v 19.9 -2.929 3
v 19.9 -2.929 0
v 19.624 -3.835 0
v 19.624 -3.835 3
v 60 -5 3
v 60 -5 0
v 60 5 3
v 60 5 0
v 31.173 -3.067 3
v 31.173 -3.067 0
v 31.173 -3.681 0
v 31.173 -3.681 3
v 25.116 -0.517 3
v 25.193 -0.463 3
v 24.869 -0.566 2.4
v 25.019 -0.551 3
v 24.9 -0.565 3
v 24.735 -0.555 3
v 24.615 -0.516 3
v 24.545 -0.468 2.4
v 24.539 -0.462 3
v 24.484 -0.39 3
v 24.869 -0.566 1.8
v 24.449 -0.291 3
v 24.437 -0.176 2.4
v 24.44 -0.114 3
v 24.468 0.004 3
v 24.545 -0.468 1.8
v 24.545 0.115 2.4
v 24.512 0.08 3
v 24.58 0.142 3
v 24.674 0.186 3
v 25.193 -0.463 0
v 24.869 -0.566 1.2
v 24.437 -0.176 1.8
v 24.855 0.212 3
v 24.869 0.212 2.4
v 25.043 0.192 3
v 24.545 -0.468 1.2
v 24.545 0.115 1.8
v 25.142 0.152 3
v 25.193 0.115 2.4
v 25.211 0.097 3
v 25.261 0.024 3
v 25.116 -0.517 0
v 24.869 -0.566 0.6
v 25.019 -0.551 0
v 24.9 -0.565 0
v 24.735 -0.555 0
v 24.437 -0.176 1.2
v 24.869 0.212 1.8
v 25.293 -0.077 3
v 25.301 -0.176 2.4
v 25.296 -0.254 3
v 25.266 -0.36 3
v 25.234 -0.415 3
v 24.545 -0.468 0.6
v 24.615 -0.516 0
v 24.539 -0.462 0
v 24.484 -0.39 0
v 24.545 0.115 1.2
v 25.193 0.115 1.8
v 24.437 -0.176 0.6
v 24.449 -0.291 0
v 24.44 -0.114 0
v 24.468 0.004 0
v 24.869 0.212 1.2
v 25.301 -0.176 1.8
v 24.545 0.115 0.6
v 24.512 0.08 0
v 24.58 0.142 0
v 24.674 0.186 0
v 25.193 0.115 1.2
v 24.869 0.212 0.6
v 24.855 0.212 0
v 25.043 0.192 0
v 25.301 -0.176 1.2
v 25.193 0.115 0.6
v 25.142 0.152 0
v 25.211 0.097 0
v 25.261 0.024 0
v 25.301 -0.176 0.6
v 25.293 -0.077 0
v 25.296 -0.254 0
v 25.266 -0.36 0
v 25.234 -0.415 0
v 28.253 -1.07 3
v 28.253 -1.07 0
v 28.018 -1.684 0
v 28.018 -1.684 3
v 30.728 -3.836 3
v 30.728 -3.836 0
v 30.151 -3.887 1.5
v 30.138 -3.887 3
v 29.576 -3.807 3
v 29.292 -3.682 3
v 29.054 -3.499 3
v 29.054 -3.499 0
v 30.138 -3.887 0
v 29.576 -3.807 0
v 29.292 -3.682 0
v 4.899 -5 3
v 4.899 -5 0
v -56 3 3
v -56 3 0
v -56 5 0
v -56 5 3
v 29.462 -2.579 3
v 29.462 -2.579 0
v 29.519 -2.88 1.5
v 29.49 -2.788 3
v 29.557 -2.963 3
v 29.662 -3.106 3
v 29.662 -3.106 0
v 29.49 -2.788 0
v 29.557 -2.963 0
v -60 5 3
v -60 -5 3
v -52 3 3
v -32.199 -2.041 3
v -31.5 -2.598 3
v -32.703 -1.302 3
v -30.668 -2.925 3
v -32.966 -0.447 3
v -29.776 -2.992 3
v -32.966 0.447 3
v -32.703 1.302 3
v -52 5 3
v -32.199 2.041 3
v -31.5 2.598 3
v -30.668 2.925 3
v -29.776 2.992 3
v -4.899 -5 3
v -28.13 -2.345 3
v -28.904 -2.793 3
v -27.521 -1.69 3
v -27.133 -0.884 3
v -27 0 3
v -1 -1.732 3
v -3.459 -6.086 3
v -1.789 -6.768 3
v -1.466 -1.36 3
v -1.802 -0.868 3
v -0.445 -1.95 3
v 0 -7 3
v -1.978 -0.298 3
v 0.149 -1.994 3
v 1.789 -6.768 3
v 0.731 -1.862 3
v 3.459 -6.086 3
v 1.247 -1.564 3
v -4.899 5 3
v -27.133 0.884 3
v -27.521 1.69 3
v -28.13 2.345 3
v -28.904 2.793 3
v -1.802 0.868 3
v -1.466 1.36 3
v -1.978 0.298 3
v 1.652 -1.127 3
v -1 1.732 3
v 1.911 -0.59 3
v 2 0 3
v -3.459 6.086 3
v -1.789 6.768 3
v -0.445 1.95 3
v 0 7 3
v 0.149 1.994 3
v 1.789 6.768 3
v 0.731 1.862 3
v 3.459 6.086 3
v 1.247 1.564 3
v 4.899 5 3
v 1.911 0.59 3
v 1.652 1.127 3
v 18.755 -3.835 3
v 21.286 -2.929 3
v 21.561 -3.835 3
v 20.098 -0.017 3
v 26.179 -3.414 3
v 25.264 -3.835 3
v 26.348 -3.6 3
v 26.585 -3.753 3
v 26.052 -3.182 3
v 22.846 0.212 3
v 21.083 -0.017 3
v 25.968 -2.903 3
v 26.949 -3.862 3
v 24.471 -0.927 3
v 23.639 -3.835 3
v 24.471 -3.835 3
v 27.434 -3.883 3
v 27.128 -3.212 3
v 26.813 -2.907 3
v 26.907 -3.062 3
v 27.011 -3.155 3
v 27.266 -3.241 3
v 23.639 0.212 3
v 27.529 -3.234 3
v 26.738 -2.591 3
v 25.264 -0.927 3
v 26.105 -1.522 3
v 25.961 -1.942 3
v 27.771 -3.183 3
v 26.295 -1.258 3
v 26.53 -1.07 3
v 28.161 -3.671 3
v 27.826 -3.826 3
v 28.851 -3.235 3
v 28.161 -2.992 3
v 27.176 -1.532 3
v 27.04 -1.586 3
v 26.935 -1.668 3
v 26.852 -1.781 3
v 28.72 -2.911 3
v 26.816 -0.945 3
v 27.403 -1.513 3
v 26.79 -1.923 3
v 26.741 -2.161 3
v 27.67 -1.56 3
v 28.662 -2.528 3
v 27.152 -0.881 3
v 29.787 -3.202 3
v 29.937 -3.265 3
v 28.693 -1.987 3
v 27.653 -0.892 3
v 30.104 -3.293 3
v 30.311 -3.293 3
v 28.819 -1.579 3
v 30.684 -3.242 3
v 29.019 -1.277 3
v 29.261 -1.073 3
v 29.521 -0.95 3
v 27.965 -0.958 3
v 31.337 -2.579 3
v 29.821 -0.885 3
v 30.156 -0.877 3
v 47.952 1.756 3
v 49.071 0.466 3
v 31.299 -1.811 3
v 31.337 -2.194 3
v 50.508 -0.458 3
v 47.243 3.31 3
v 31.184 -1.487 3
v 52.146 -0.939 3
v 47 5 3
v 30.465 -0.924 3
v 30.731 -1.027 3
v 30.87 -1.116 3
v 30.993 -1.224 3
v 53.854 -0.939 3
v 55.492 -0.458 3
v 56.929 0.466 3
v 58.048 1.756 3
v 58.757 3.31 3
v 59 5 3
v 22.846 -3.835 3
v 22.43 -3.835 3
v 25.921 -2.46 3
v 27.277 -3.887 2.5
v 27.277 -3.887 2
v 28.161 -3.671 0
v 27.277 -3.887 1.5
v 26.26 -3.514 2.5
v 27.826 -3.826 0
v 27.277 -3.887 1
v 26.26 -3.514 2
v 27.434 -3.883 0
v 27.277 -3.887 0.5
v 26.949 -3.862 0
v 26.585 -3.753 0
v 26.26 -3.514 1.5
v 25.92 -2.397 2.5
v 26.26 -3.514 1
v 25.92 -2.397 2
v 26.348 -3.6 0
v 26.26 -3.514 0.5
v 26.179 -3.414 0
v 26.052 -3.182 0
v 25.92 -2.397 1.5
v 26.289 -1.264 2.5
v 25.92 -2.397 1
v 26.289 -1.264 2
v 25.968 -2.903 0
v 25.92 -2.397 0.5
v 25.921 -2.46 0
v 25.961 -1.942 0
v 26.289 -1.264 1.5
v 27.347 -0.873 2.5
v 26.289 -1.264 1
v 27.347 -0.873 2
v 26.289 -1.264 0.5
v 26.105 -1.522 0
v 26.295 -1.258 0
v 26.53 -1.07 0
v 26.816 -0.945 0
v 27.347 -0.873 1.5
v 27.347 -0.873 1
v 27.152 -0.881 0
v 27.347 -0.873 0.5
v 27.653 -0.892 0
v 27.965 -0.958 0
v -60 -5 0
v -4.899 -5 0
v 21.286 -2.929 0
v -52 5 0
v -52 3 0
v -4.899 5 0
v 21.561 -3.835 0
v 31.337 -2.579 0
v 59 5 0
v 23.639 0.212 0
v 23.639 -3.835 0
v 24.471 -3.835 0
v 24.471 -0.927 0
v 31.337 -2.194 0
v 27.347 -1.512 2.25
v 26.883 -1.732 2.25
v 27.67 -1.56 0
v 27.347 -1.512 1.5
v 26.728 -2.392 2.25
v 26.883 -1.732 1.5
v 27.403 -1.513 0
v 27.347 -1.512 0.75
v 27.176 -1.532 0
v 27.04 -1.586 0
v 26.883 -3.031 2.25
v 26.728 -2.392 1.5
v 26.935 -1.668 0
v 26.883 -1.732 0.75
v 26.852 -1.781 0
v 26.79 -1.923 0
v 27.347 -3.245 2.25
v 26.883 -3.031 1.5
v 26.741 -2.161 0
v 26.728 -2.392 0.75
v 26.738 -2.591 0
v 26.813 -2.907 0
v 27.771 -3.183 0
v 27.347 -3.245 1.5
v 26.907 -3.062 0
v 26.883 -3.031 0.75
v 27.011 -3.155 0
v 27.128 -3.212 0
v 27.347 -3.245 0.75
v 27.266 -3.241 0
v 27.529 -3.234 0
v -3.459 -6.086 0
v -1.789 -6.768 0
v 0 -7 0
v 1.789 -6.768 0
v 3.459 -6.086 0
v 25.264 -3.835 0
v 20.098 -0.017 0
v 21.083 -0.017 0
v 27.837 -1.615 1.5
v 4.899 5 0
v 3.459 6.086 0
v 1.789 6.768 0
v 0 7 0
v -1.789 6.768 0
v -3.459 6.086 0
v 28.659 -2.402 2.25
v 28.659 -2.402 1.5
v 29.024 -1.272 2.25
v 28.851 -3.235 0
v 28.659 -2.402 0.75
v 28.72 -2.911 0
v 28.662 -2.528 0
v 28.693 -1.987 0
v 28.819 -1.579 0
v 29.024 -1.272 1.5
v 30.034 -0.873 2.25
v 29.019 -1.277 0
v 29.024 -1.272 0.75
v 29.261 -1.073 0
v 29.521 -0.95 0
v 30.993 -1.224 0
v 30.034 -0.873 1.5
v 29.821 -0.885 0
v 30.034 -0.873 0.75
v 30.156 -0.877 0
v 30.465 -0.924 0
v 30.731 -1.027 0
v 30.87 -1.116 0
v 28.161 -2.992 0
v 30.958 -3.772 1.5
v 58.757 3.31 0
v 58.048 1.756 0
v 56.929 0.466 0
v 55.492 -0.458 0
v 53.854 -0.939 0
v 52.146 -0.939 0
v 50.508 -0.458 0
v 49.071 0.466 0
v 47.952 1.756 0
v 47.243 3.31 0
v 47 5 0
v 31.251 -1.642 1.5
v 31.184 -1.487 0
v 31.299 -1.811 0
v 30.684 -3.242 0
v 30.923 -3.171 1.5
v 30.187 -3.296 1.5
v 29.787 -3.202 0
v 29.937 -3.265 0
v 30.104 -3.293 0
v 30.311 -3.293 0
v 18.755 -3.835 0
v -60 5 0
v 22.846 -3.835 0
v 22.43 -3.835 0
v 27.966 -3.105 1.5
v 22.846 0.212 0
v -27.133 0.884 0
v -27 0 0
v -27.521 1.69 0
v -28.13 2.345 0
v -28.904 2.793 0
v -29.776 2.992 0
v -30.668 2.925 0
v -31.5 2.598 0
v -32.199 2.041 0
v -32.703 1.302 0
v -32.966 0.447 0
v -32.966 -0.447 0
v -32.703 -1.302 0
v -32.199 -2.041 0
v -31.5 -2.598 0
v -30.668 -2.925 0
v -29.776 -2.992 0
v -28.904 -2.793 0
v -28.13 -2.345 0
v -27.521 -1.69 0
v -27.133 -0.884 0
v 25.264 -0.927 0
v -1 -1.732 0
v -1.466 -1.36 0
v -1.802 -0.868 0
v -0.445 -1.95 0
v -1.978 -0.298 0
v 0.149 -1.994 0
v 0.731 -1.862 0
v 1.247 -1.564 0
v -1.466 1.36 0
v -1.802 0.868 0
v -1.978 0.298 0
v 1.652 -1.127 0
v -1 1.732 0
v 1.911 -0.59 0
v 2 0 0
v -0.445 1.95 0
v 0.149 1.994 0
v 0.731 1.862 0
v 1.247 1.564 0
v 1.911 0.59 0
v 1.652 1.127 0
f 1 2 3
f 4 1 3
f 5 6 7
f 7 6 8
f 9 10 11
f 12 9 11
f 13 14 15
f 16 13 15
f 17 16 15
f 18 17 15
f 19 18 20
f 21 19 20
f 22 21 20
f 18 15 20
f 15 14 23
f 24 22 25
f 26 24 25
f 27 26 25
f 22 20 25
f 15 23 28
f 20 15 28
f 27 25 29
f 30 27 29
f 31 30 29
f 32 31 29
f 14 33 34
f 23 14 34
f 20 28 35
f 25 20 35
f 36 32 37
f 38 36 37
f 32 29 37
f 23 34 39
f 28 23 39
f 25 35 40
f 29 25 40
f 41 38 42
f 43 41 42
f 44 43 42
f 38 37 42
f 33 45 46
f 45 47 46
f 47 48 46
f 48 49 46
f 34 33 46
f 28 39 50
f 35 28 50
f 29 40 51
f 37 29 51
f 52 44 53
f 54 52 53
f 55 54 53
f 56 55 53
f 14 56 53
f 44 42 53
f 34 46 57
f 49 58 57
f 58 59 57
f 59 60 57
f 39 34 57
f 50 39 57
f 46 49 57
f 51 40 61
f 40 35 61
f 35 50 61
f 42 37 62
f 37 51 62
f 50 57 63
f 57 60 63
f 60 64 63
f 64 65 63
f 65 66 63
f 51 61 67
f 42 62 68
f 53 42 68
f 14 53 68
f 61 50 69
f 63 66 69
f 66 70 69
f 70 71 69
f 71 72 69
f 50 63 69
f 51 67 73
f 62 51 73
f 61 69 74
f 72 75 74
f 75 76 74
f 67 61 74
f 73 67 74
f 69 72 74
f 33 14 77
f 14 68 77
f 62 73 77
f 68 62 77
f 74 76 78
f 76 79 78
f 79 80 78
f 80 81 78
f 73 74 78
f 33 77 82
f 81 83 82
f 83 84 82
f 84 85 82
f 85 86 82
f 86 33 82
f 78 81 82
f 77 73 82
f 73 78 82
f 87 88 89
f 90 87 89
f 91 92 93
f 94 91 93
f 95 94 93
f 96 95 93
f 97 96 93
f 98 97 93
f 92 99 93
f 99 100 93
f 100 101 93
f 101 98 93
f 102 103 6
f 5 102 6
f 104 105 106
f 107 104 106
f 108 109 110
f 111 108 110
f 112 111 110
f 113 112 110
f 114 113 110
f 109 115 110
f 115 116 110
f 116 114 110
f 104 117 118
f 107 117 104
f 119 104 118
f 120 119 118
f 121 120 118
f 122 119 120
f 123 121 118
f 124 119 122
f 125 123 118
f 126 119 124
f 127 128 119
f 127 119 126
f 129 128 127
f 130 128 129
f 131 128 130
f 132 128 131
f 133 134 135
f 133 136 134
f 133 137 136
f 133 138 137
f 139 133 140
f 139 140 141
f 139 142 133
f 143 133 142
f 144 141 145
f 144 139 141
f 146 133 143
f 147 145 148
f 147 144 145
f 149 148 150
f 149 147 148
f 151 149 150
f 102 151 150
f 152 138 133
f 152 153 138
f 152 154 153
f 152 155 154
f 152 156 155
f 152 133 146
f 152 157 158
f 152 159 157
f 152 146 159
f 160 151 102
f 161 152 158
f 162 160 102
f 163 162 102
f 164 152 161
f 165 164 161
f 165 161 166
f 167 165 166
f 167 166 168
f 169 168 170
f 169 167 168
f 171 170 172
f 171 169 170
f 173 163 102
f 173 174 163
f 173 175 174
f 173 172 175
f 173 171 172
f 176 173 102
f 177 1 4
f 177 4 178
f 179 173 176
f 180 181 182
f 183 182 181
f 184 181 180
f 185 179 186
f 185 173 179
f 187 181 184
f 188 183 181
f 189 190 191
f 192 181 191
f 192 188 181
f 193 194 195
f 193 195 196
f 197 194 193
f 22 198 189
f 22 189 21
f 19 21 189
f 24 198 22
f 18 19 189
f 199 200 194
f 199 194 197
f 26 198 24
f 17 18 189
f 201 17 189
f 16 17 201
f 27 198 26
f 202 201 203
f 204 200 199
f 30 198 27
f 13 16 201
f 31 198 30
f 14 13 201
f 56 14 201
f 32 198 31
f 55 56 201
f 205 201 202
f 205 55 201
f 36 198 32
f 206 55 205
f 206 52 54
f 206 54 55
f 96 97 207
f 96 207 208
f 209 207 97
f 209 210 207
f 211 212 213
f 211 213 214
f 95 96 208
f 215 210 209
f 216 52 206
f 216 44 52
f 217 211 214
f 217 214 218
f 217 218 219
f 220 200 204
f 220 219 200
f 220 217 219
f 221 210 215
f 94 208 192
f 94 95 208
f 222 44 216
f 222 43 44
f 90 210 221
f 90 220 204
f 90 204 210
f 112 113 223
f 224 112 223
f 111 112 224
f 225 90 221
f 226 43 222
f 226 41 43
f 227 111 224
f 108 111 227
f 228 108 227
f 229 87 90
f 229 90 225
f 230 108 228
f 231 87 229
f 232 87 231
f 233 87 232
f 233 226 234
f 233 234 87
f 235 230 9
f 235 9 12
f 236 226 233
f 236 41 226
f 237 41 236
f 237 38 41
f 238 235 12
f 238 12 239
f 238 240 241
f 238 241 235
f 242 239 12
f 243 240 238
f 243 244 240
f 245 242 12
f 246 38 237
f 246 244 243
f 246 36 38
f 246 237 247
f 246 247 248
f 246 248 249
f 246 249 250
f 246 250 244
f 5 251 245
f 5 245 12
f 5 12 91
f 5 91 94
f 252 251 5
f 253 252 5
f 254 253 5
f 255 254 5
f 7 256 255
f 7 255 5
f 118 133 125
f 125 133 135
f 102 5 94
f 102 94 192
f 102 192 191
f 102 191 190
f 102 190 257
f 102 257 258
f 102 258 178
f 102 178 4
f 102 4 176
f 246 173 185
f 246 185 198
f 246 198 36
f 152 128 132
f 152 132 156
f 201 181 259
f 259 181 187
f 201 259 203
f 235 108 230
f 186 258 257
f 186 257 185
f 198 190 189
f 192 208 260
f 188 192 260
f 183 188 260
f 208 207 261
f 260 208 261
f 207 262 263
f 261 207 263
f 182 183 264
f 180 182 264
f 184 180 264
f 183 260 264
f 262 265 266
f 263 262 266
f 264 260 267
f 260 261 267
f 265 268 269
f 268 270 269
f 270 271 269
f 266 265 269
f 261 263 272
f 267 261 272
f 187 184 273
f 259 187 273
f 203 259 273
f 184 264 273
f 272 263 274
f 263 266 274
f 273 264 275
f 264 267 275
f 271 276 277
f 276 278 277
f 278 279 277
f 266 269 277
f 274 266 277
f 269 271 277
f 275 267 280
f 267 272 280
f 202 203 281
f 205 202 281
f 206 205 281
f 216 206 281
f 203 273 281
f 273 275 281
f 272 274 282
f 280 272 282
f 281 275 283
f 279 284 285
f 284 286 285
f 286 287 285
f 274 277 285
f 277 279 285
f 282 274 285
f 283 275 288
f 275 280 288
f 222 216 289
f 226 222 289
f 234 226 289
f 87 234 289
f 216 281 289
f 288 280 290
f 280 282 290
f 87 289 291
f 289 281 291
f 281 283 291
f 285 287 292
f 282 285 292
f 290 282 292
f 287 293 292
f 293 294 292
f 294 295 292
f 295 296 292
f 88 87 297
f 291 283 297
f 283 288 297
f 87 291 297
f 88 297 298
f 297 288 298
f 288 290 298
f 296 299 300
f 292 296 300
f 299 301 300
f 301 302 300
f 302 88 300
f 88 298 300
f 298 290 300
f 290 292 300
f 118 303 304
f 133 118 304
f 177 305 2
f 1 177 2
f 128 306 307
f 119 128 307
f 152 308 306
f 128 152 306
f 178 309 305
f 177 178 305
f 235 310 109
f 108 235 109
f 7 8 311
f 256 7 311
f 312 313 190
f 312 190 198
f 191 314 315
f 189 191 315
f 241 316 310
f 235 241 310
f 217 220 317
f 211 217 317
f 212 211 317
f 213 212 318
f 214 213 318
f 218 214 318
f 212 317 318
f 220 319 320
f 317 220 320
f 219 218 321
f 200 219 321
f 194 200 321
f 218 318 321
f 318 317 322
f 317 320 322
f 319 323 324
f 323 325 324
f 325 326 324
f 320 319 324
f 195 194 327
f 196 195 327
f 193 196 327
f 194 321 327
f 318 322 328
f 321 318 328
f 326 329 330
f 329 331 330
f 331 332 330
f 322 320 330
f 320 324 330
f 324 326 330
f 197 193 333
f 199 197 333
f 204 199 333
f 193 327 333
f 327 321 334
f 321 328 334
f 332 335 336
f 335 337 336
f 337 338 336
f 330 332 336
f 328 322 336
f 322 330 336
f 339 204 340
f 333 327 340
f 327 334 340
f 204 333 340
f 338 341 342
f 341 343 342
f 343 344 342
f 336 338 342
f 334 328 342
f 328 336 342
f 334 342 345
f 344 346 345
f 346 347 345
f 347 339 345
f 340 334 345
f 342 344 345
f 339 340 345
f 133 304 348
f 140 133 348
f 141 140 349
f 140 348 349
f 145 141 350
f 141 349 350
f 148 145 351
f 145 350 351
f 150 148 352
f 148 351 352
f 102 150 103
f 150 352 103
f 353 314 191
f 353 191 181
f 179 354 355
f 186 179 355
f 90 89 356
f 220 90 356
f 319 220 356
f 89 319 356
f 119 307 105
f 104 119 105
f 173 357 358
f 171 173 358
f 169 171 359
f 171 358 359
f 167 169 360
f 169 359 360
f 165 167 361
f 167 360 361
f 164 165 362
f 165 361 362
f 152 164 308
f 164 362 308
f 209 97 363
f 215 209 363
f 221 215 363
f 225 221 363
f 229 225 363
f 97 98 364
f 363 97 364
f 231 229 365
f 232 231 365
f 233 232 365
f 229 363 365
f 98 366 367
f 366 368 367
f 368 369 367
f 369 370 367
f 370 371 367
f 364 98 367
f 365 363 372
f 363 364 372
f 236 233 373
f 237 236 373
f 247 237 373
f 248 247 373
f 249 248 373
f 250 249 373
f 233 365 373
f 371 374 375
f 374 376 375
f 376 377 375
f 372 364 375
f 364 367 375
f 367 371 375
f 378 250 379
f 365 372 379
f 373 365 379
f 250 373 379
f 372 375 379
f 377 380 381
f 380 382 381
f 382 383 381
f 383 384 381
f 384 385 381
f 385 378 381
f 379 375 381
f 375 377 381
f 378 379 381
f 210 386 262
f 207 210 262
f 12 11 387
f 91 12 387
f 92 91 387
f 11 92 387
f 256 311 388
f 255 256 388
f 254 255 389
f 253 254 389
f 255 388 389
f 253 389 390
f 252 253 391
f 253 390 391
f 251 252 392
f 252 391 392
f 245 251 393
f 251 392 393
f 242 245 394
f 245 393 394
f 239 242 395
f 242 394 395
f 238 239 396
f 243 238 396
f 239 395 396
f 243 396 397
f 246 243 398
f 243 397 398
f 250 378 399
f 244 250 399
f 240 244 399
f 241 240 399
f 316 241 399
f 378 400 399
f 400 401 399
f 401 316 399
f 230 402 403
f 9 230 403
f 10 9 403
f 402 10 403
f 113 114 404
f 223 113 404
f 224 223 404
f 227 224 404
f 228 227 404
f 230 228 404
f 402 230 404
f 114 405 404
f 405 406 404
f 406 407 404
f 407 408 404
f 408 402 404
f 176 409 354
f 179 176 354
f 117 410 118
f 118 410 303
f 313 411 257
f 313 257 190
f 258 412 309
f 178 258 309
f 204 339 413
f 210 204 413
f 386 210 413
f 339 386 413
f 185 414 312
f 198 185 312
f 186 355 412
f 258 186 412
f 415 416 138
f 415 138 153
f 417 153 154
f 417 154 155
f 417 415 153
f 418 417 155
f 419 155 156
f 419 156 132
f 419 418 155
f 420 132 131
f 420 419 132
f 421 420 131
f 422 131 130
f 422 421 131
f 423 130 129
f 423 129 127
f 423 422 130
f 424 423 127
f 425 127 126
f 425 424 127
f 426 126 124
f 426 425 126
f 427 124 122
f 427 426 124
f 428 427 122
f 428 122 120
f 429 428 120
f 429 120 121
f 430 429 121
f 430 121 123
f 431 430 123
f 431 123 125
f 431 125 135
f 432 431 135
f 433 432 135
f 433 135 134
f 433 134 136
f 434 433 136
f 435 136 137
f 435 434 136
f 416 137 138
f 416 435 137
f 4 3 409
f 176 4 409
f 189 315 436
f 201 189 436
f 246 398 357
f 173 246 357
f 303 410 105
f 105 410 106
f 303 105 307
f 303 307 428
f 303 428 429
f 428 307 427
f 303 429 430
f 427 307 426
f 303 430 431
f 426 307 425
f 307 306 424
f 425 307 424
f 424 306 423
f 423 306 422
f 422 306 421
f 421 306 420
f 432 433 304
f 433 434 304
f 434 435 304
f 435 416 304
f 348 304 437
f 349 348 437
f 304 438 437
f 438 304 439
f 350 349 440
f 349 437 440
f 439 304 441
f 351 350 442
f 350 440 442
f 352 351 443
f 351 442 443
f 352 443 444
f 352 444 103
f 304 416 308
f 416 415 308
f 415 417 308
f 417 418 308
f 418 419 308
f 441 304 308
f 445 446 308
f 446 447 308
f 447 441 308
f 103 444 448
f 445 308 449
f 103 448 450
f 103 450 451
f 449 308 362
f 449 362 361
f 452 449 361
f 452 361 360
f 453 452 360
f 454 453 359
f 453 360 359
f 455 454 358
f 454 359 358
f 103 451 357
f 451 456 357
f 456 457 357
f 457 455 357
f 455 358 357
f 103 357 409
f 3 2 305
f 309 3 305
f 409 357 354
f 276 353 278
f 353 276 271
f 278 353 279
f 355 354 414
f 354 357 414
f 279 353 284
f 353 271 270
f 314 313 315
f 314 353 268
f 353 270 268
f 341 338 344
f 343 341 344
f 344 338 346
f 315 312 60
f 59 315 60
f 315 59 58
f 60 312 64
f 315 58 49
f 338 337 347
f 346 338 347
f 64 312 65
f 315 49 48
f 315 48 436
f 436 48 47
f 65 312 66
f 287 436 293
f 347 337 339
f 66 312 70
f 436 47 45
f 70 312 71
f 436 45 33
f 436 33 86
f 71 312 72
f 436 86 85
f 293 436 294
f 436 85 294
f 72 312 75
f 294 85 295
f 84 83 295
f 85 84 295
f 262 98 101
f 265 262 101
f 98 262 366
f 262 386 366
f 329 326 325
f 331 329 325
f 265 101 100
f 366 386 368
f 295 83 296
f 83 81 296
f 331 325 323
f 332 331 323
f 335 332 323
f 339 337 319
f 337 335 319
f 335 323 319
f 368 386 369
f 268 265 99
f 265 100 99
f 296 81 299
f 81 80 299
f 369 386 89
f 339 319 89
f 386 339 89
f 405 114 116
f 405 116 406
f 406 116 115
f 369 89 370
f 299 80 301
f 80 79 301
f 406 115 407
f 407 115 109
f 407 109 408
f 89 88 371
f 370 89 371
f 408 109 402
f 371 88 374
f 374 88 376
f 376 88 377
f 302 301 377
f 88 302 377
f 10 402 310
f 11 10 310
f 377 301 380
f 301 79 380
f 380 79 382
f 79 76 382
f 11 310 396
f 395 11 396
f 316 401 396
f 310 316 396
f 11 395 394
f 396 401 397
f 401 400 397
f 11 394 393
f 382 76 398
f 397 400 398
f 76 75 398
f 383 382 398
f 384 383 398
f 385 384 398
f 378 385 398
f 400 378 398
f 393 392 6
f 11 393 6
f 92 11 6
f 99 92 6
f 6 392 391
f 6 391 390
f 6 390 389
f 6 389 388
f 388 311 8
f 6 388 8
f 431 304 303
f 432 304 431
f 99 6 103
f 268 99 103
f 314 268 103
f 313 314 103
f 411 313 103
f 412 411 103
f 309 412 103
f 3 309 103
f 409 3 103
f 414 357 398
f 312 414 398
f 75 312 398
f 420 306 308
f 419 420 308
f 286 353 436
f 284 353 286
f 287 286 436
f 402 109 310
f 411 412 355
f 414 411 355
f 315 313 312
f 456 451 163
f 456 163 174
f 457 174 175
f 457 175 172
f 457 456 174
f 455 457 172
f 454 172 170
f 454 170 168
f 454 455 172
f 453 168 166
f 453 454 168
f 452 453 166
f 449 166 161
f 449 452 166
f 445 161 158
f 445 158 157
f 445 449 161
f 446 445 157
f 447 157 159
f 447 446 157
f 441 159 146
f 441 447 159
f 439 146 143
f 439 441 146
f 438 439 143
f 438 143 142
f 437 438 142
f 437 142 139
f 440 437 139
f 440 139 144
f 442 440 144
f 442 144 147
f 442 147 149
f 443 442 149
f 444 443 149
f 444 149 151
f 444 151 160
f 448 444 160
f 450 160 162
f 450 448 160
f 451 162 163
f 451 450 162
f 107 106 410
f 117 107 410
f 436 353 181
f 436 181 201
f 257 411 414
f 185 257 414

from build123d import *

# Parameters (mm, degrees)
F0_R     = 3
F0_W     = 0.793037466
F0_H     = 2.9075266591
F0_H_2   = 4.0467378773
F0_R_2   = 2
F1_DEPTH = 3


with BuildPart() as f1:
    # F0 (on Top) → F1 (new body)
    with BuildSketch(Plane.XY):
        with BuildLine():
            Line((-60, 5), (-60, -5))
            Line((-60, -5), (-4.8989794856, -5))
            ThreePointArc((-4.8989794856, -5), (-7, 0), (-4.8989794856, 5))
            Line((-4.8989794856, 5), (-52, 5))
            Line((-52, 5), (-52, 3))
            Line((-52, 3), (-56, 3))
            Line((-56, 3), (-56, 5))
            Line((-56, 5), (-60, 5))
        make_face()
        with Locations((-30, 0)):
            Circle(F0_R, mode=Mode.SUBTRACT)
        with BuildLine():
            ThreePointArc((7, 0), (6.4534043883, -2.7117470016), (4.8989794856, -5))
            Line((4.8989794856, -5), (60, -5))
            Line((60, -5), (60, 5))
            Line((60, 5), (59, 5))
            ThreePointArc((59, 5), (53, -1), (47, 5))
            Line((47, 5), (4.8989794856, 5))
            ThreePointArc((4.8989794856, 5), (6.4534043883, 2.7117470016), (7, 0))
        make_face()
        Polygon((22.4301818638, -3.8345400244), (21.5614188895, -3.8345400244), (21.2859777549, -2.9291625186), (19.8996184492, -2.9291625186), (19.6241773147, -3.8345400244), (18.7554143404, -3.8345400244), (20.0976697786, -0.0166429689), (21.0829335349, -0.0166429689), align=None, mode=Mode.SUBTRACT)
        with Locations((24.8679607269, -2.3807766948)):
            Rectangle(F0_W, F0_H, mode=Mode.SUBTRACT)
        with BuildLine():
            add(Edge.make_bspline(
                [(27.7725748665, -3.8399489893), (27.576187834, -3.8869653763), (27.277446543, -3.8869653763)],
                knots=[0, 0, 0, 1, 1, 1], degree=2))
            add(Edge.make_bspline(
                [(27.277446543, -3.8869653763), (25.9202124328, -3.8869653763), (25.9202124328, -2.3965875152)],
                knots=[0, 0, 0, 1, 1, 1], degree=2))
            add(Edge.make_bspline(
                [(25.9202124328, -2.3965875152), (25.9202124328, -1.6551432527), (26.2892702672, -1.2640334846)],
                knots=[0, 0, 0, 1, 1, 1], degree=2))
            add(Edge.make_bspline(
                [(26.2892702672, -1.2640334846), (26.6583281016, -0.8729237165), (27.3473470122, -0.8729237165)],
                knots=[0, 0, 0, 1, 1, 1], degree=2))
            add(Edge.make_bspline(
                [(27.3473470122, -0.8729237165), (27.8516289686, -0.8729237165), (28.252724518, -1.0701428974)],
                knots=[0, 0, 0, 1, 1, 1], degree=2))
            Line((28.252724518, -1.0701428974), (28.0180586571, -1.6842684482))
            add(Edge.make_bspline(
                [(28.0180586571, -1.6842684482), (27.8308252575, -1.6085429399), (27.6698045338, -1.5602783302)],
                knots=[0, 0, 0, 1, 1, 1], degree=2))
            add(Edge.make_bspline(
                [(27.6698045338, -1.5602783302), (27.5087838101, -1.5120137206), (27.3473470122, -1.5120137206)],
                knots=[0, 0, 0, 1, 1, 1], degree=2))
            add(Edge.make_bspline(
                [(27.3473470122, -1.5120137206), (26.7282285708, -1.5120137206), (26.7282285708, -2.3915946246)],
                knots=[0, 0, 0, 1, 1, 1], degree=2))
            add(Edge.make_bspline(
                [(26.7282285708, -2.3915946246), (26.7282285708, -3.2445467785), (27.3473470122, -3.2445467785)],
                knots=[0, 0, 0, 1, 1, 1], degree=2))
            add(Edge.make_bspline(
                [(27.3473470122, -3.2445467785), (27.576187834, -3.2445467785), (27.7713266438, -3.1833838679)],
                knots=[0, 0, 0, 1, 1, 1], degree=2))
            add(Edge.make_bspline(
                [(27.7713266438, -3.1833838679), (27.9664654537, -3.1222209574), (28.1611881893, -2.9915736518)],
                knots=[0, 0, 0, 1, 1, 1], degree=2))
            Line((28.1611881893, -2.9915736518), (28.1611881893, -3.6706067812))
            add(Edge.make_bspline(
                [(28.1611881893, -3.6706067812), (27.968961899, -3.7929326023), (27.7725748665, -3.8399489893)],
                knots=[0, 0, 0, 1, 1, 1], degree=2))
        make_face(mode=Mode.SUBTRACT)
        with BuildLine():
            add(Edge.make_bspline(
                [(30.7283661353, -3.8362043213), (30.4920359776, -3.8869653763), (30.150855116, -3.8869653763)],
                knots=[0, 0, 0, 1, 1, 1], degree=2))
            add(Edge.make_bspline(
                [(30.150855116, -3.8869653763), (29.4493539787, -3.8869653763), (29.0540834684, -3.499184202)],
                knots=[0, 0, 0, 1, 1, 1], degree=2))
            add(Edge.make_bspline(
                [(29.0540834684, -3.499184202), (28.6588129581, -3.1114030276), (28.6588129581, -2.4015804059)],
                knots=[0, 0, 0, 1, 1, 1], degree=2))
            add(Edge.make_bspline(
                [(28.6588129581, -2.4015804059), (28.6588129581, -1.6709540731), (29.0241261245, -1.2719388948)],
                knots=[0, 0, 0, 1, 1, 1], degree=2))
            add(Edge.make_bspline(
                [(29.0241261245, -1.2719388948), (29.3894392909, -0.8729237165), (30.034354334, -0.8729237165)],
                knots=[0, 0, 0, 1, 1, 1], degree=2))
            add(Edge.make_bspline(
                [(30.034354334, -0.8729237165), (30.6501441817, -0.8729237165), (30.9934054143, -1.2236742851)],
                knots=[0, 0, 0, 1, 1, 1], degree=2))
            add(Edge.make_bspline(
                [(30.9934054143, -1.2236742851), (31.336666647, -1.5744248538), (31.336666647, -2.1935432952)],
                knots=[0, 0, 0, 1, 1, 1], degree=2))
            Line((31.336666647, -2.1935432952), (31.336666647, -2.5788280242))
            Line((31.336666647, -2.5788280242), (29.4618362054, -2.5788280242))
            add(Edge.make_bspline(
                [(29.4618362054, -2.5788280242), (29.4751505805, -2.916680292), (29.6623839801, -3.106410137)],
                knots=[0, 0, 0, 1, 1, 1], degree=2))
            add(Edge.make_bspline(
                [(29.6623839801, -3.106410137), (29.8496173797, -3.2961399819), (30.1874696475, -3.2961399819)],
                knots=[0, 0, 0, 1, 1, 1], degree=2))
            add(Edge.make_bspline(
                [(30.1874696475, -3.2961399819), (30.4504285554, -3.2961399819), (30.6842622678, -3.2416342589)],
                knots=[0, 0, 0, 1, 1, 1], degree=2))
            add(Edge.make_bspline(
                [(30.6842622678, -3.2416342589), (30.9180959803, -3.1871285359), (31.1727334038, -3.0672991601)],
                knots=[0, 0, 0, 1, 1, 1], degree=2))
            Line((31.1727334038, -3.0672991601), (31.1727334038, -3.6814247109))
            add(Edge.make_bspline(
                [(31.1727334038, -3.6814247109), (30.9646962931, -3.7854432663), (30.7283661353, -3.8362043213)],
                knots=[0, 0, 0, 1, 1, 1], degree=2))
        make_face(mode=Mode.SUBTRACT)
        with Locations((23.2427748181, -1.8111710857)):
            Rectangle(F0_W, F0_H_2, mode=Mode.SUBTRACT)
        with BuildLine():
            add(Edge.make_bspline(
                [(24.8692089496, -0.5658609411), (24.4373239078, -0.5658609411), (24.4373239078, -0.1755833214)],
                knots=[0, 0, 0, 1, 1, 1], degree=2))
            add(Edge.make_bspline(
                [(24.4373239078, -0.1755833214), (24.4373239078, 0.2121978529), (24.8692089496, 0.2121978529)],
                knots=[0, 0, 0, 1, 1, 1], degree=2))
            add(Edge.make_bspline(
                [(24.8692089496, 0.2121978529), (25.3010939914, 0.2121978529), (25.3010939914, -0.1755833214)],
                knots=[0, 0, 0, 1, 1, 1], degree=2))
            add(Edge.make_bspline(
                [(25.3010939914, -0.1755833214), (25.3010939914, -0.3603202757), (25.1933307681, -0.4630906084)],
                knots=[0, 0, 0, 1, 1, 1], degree=2))
            add(Edge.make_bspline(
                [(25.1933307681, -0.4630906084), (25.0855675447, -0.5658609411), (24.8692089496, -0.5658609411)],
                knots=[0, 0, 0, 1, 1, 1], degree=2))
        make_face(mode=Mode.SUBTRACT)
        with BuildLine():
            Line((4.8989794856, -5), (-4.8989794856, -5))
            ThreePointArc((-4.8989794856, -5), (0, -7), (4.8989794856, -5))
        make_face()
        with BuildLine():
            ThreePointArc((-4.8989794856, 5), (-7, 0), (-4.8989794856, -5))
            Line((-4.8989794856, -5), (4.8989794856, -5))
            ThreePointArc((4.8989794856, -5), (6.4534043883, -2.7117470016), (7, 0))
            ThreePointArc((7, 0), (6.4534043883, 2.7117470016), (4.8989794856, 5))
            Line((4.8989794856, 5), (-4.8989794856, 5))
        make_face()
        Circle(F0_R_2, mode=Mode.SUBTRACT)
        with BuildLine():
            ThreePointArc((4.8989794856, 5), (0, 7), (-4.8989794856, 5))
            Line((-4.8989794856, 5), (4.8989794856, 5))
        make_face()
    extrude(amount=F1_DEPTH)


solid = f1.part
